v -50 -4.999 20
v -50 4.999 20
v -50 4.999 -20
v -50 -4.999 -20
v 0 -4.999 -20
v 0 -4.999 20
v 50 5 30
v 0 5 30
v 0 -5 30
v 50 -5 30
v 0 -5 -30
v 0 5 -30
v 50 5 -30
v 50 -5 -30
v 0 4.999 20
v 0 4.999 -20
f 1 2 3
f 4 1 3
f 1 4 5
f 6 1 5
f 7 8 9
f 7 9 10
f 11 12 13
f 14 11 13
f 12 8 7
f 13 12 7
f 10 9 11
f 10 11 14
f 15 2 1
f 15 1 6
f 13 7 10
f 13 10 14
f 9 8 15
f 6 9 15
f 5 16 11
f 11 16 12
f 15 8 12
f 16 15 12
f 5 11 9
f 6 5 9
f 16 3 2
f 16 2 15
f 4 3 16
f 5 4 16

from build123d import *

# Parameters (mm, degrees)
SKETCH1_W           = 100
SKETCH1_H           = 60
BOSS_EXTRUDE1_DEPTH = 5
SKETCH2_W           = 50
SKETCH2_H           = 10
CUT_EXTRUDE1_DEPTH  = 60.160797831
SKETCH3_W           = 50
SKETCH3_H           = 40
CUT_EXTRUDE2_DEPTH  = 0.001


with BuildPart() as part:
    # Sketch1 → Boss-Extrude1 (new, symmetric)
    with BuildSketch(Plane(origin=(0, 0, 0), x_dir=(1, 0, 0), z_dir=(0, 1, 0))):
        Rectangle(SKETCH1_W, SKETCH1_H)
    extrude(amount=BOSS_EXTRUDE1_DEPTH, both=True)

    # Sketch2 → Cut-Extrude1 (cut, through all)
    with BuildSketch(Plane(origin=(0, 5, 0), x_dir=(1, 0, 0), z_dir=(0, 1, 0))):
        with Locations((-25, 25)):
            Rectangle(SKETCH2_W, SKETCH2_H)
        with Locations((-25, -25)):
            Rectangle(SKETCH2_W, SKETCH2_H)
    extrude(amount=-CUT_EXTRUDE1_DEPTH, mode=Mode.SUBTRACT)

    # Sketch3 → Cut-Extrude2 (cut)
    with BuildSketch(Plane(origin=(0, 5, 0), x_dir=(1, 0, 0), z_dir=(0, 1, 0))):
        with Locations((-25, 0)):
            Rectangle(SKETCH3_W, SKETCH3_H)
    cut_extrude2 = extrude(amount=-CUT_EXTRUDE2_DEPTH, mode=Mode.SUBTRACT)

    # Mirror1: Cut-Extrude2 across plane
    add(cut_extrude2.mirror(Plane.ZX), mode=Mode.SUBTRACT)


solid = part.part
